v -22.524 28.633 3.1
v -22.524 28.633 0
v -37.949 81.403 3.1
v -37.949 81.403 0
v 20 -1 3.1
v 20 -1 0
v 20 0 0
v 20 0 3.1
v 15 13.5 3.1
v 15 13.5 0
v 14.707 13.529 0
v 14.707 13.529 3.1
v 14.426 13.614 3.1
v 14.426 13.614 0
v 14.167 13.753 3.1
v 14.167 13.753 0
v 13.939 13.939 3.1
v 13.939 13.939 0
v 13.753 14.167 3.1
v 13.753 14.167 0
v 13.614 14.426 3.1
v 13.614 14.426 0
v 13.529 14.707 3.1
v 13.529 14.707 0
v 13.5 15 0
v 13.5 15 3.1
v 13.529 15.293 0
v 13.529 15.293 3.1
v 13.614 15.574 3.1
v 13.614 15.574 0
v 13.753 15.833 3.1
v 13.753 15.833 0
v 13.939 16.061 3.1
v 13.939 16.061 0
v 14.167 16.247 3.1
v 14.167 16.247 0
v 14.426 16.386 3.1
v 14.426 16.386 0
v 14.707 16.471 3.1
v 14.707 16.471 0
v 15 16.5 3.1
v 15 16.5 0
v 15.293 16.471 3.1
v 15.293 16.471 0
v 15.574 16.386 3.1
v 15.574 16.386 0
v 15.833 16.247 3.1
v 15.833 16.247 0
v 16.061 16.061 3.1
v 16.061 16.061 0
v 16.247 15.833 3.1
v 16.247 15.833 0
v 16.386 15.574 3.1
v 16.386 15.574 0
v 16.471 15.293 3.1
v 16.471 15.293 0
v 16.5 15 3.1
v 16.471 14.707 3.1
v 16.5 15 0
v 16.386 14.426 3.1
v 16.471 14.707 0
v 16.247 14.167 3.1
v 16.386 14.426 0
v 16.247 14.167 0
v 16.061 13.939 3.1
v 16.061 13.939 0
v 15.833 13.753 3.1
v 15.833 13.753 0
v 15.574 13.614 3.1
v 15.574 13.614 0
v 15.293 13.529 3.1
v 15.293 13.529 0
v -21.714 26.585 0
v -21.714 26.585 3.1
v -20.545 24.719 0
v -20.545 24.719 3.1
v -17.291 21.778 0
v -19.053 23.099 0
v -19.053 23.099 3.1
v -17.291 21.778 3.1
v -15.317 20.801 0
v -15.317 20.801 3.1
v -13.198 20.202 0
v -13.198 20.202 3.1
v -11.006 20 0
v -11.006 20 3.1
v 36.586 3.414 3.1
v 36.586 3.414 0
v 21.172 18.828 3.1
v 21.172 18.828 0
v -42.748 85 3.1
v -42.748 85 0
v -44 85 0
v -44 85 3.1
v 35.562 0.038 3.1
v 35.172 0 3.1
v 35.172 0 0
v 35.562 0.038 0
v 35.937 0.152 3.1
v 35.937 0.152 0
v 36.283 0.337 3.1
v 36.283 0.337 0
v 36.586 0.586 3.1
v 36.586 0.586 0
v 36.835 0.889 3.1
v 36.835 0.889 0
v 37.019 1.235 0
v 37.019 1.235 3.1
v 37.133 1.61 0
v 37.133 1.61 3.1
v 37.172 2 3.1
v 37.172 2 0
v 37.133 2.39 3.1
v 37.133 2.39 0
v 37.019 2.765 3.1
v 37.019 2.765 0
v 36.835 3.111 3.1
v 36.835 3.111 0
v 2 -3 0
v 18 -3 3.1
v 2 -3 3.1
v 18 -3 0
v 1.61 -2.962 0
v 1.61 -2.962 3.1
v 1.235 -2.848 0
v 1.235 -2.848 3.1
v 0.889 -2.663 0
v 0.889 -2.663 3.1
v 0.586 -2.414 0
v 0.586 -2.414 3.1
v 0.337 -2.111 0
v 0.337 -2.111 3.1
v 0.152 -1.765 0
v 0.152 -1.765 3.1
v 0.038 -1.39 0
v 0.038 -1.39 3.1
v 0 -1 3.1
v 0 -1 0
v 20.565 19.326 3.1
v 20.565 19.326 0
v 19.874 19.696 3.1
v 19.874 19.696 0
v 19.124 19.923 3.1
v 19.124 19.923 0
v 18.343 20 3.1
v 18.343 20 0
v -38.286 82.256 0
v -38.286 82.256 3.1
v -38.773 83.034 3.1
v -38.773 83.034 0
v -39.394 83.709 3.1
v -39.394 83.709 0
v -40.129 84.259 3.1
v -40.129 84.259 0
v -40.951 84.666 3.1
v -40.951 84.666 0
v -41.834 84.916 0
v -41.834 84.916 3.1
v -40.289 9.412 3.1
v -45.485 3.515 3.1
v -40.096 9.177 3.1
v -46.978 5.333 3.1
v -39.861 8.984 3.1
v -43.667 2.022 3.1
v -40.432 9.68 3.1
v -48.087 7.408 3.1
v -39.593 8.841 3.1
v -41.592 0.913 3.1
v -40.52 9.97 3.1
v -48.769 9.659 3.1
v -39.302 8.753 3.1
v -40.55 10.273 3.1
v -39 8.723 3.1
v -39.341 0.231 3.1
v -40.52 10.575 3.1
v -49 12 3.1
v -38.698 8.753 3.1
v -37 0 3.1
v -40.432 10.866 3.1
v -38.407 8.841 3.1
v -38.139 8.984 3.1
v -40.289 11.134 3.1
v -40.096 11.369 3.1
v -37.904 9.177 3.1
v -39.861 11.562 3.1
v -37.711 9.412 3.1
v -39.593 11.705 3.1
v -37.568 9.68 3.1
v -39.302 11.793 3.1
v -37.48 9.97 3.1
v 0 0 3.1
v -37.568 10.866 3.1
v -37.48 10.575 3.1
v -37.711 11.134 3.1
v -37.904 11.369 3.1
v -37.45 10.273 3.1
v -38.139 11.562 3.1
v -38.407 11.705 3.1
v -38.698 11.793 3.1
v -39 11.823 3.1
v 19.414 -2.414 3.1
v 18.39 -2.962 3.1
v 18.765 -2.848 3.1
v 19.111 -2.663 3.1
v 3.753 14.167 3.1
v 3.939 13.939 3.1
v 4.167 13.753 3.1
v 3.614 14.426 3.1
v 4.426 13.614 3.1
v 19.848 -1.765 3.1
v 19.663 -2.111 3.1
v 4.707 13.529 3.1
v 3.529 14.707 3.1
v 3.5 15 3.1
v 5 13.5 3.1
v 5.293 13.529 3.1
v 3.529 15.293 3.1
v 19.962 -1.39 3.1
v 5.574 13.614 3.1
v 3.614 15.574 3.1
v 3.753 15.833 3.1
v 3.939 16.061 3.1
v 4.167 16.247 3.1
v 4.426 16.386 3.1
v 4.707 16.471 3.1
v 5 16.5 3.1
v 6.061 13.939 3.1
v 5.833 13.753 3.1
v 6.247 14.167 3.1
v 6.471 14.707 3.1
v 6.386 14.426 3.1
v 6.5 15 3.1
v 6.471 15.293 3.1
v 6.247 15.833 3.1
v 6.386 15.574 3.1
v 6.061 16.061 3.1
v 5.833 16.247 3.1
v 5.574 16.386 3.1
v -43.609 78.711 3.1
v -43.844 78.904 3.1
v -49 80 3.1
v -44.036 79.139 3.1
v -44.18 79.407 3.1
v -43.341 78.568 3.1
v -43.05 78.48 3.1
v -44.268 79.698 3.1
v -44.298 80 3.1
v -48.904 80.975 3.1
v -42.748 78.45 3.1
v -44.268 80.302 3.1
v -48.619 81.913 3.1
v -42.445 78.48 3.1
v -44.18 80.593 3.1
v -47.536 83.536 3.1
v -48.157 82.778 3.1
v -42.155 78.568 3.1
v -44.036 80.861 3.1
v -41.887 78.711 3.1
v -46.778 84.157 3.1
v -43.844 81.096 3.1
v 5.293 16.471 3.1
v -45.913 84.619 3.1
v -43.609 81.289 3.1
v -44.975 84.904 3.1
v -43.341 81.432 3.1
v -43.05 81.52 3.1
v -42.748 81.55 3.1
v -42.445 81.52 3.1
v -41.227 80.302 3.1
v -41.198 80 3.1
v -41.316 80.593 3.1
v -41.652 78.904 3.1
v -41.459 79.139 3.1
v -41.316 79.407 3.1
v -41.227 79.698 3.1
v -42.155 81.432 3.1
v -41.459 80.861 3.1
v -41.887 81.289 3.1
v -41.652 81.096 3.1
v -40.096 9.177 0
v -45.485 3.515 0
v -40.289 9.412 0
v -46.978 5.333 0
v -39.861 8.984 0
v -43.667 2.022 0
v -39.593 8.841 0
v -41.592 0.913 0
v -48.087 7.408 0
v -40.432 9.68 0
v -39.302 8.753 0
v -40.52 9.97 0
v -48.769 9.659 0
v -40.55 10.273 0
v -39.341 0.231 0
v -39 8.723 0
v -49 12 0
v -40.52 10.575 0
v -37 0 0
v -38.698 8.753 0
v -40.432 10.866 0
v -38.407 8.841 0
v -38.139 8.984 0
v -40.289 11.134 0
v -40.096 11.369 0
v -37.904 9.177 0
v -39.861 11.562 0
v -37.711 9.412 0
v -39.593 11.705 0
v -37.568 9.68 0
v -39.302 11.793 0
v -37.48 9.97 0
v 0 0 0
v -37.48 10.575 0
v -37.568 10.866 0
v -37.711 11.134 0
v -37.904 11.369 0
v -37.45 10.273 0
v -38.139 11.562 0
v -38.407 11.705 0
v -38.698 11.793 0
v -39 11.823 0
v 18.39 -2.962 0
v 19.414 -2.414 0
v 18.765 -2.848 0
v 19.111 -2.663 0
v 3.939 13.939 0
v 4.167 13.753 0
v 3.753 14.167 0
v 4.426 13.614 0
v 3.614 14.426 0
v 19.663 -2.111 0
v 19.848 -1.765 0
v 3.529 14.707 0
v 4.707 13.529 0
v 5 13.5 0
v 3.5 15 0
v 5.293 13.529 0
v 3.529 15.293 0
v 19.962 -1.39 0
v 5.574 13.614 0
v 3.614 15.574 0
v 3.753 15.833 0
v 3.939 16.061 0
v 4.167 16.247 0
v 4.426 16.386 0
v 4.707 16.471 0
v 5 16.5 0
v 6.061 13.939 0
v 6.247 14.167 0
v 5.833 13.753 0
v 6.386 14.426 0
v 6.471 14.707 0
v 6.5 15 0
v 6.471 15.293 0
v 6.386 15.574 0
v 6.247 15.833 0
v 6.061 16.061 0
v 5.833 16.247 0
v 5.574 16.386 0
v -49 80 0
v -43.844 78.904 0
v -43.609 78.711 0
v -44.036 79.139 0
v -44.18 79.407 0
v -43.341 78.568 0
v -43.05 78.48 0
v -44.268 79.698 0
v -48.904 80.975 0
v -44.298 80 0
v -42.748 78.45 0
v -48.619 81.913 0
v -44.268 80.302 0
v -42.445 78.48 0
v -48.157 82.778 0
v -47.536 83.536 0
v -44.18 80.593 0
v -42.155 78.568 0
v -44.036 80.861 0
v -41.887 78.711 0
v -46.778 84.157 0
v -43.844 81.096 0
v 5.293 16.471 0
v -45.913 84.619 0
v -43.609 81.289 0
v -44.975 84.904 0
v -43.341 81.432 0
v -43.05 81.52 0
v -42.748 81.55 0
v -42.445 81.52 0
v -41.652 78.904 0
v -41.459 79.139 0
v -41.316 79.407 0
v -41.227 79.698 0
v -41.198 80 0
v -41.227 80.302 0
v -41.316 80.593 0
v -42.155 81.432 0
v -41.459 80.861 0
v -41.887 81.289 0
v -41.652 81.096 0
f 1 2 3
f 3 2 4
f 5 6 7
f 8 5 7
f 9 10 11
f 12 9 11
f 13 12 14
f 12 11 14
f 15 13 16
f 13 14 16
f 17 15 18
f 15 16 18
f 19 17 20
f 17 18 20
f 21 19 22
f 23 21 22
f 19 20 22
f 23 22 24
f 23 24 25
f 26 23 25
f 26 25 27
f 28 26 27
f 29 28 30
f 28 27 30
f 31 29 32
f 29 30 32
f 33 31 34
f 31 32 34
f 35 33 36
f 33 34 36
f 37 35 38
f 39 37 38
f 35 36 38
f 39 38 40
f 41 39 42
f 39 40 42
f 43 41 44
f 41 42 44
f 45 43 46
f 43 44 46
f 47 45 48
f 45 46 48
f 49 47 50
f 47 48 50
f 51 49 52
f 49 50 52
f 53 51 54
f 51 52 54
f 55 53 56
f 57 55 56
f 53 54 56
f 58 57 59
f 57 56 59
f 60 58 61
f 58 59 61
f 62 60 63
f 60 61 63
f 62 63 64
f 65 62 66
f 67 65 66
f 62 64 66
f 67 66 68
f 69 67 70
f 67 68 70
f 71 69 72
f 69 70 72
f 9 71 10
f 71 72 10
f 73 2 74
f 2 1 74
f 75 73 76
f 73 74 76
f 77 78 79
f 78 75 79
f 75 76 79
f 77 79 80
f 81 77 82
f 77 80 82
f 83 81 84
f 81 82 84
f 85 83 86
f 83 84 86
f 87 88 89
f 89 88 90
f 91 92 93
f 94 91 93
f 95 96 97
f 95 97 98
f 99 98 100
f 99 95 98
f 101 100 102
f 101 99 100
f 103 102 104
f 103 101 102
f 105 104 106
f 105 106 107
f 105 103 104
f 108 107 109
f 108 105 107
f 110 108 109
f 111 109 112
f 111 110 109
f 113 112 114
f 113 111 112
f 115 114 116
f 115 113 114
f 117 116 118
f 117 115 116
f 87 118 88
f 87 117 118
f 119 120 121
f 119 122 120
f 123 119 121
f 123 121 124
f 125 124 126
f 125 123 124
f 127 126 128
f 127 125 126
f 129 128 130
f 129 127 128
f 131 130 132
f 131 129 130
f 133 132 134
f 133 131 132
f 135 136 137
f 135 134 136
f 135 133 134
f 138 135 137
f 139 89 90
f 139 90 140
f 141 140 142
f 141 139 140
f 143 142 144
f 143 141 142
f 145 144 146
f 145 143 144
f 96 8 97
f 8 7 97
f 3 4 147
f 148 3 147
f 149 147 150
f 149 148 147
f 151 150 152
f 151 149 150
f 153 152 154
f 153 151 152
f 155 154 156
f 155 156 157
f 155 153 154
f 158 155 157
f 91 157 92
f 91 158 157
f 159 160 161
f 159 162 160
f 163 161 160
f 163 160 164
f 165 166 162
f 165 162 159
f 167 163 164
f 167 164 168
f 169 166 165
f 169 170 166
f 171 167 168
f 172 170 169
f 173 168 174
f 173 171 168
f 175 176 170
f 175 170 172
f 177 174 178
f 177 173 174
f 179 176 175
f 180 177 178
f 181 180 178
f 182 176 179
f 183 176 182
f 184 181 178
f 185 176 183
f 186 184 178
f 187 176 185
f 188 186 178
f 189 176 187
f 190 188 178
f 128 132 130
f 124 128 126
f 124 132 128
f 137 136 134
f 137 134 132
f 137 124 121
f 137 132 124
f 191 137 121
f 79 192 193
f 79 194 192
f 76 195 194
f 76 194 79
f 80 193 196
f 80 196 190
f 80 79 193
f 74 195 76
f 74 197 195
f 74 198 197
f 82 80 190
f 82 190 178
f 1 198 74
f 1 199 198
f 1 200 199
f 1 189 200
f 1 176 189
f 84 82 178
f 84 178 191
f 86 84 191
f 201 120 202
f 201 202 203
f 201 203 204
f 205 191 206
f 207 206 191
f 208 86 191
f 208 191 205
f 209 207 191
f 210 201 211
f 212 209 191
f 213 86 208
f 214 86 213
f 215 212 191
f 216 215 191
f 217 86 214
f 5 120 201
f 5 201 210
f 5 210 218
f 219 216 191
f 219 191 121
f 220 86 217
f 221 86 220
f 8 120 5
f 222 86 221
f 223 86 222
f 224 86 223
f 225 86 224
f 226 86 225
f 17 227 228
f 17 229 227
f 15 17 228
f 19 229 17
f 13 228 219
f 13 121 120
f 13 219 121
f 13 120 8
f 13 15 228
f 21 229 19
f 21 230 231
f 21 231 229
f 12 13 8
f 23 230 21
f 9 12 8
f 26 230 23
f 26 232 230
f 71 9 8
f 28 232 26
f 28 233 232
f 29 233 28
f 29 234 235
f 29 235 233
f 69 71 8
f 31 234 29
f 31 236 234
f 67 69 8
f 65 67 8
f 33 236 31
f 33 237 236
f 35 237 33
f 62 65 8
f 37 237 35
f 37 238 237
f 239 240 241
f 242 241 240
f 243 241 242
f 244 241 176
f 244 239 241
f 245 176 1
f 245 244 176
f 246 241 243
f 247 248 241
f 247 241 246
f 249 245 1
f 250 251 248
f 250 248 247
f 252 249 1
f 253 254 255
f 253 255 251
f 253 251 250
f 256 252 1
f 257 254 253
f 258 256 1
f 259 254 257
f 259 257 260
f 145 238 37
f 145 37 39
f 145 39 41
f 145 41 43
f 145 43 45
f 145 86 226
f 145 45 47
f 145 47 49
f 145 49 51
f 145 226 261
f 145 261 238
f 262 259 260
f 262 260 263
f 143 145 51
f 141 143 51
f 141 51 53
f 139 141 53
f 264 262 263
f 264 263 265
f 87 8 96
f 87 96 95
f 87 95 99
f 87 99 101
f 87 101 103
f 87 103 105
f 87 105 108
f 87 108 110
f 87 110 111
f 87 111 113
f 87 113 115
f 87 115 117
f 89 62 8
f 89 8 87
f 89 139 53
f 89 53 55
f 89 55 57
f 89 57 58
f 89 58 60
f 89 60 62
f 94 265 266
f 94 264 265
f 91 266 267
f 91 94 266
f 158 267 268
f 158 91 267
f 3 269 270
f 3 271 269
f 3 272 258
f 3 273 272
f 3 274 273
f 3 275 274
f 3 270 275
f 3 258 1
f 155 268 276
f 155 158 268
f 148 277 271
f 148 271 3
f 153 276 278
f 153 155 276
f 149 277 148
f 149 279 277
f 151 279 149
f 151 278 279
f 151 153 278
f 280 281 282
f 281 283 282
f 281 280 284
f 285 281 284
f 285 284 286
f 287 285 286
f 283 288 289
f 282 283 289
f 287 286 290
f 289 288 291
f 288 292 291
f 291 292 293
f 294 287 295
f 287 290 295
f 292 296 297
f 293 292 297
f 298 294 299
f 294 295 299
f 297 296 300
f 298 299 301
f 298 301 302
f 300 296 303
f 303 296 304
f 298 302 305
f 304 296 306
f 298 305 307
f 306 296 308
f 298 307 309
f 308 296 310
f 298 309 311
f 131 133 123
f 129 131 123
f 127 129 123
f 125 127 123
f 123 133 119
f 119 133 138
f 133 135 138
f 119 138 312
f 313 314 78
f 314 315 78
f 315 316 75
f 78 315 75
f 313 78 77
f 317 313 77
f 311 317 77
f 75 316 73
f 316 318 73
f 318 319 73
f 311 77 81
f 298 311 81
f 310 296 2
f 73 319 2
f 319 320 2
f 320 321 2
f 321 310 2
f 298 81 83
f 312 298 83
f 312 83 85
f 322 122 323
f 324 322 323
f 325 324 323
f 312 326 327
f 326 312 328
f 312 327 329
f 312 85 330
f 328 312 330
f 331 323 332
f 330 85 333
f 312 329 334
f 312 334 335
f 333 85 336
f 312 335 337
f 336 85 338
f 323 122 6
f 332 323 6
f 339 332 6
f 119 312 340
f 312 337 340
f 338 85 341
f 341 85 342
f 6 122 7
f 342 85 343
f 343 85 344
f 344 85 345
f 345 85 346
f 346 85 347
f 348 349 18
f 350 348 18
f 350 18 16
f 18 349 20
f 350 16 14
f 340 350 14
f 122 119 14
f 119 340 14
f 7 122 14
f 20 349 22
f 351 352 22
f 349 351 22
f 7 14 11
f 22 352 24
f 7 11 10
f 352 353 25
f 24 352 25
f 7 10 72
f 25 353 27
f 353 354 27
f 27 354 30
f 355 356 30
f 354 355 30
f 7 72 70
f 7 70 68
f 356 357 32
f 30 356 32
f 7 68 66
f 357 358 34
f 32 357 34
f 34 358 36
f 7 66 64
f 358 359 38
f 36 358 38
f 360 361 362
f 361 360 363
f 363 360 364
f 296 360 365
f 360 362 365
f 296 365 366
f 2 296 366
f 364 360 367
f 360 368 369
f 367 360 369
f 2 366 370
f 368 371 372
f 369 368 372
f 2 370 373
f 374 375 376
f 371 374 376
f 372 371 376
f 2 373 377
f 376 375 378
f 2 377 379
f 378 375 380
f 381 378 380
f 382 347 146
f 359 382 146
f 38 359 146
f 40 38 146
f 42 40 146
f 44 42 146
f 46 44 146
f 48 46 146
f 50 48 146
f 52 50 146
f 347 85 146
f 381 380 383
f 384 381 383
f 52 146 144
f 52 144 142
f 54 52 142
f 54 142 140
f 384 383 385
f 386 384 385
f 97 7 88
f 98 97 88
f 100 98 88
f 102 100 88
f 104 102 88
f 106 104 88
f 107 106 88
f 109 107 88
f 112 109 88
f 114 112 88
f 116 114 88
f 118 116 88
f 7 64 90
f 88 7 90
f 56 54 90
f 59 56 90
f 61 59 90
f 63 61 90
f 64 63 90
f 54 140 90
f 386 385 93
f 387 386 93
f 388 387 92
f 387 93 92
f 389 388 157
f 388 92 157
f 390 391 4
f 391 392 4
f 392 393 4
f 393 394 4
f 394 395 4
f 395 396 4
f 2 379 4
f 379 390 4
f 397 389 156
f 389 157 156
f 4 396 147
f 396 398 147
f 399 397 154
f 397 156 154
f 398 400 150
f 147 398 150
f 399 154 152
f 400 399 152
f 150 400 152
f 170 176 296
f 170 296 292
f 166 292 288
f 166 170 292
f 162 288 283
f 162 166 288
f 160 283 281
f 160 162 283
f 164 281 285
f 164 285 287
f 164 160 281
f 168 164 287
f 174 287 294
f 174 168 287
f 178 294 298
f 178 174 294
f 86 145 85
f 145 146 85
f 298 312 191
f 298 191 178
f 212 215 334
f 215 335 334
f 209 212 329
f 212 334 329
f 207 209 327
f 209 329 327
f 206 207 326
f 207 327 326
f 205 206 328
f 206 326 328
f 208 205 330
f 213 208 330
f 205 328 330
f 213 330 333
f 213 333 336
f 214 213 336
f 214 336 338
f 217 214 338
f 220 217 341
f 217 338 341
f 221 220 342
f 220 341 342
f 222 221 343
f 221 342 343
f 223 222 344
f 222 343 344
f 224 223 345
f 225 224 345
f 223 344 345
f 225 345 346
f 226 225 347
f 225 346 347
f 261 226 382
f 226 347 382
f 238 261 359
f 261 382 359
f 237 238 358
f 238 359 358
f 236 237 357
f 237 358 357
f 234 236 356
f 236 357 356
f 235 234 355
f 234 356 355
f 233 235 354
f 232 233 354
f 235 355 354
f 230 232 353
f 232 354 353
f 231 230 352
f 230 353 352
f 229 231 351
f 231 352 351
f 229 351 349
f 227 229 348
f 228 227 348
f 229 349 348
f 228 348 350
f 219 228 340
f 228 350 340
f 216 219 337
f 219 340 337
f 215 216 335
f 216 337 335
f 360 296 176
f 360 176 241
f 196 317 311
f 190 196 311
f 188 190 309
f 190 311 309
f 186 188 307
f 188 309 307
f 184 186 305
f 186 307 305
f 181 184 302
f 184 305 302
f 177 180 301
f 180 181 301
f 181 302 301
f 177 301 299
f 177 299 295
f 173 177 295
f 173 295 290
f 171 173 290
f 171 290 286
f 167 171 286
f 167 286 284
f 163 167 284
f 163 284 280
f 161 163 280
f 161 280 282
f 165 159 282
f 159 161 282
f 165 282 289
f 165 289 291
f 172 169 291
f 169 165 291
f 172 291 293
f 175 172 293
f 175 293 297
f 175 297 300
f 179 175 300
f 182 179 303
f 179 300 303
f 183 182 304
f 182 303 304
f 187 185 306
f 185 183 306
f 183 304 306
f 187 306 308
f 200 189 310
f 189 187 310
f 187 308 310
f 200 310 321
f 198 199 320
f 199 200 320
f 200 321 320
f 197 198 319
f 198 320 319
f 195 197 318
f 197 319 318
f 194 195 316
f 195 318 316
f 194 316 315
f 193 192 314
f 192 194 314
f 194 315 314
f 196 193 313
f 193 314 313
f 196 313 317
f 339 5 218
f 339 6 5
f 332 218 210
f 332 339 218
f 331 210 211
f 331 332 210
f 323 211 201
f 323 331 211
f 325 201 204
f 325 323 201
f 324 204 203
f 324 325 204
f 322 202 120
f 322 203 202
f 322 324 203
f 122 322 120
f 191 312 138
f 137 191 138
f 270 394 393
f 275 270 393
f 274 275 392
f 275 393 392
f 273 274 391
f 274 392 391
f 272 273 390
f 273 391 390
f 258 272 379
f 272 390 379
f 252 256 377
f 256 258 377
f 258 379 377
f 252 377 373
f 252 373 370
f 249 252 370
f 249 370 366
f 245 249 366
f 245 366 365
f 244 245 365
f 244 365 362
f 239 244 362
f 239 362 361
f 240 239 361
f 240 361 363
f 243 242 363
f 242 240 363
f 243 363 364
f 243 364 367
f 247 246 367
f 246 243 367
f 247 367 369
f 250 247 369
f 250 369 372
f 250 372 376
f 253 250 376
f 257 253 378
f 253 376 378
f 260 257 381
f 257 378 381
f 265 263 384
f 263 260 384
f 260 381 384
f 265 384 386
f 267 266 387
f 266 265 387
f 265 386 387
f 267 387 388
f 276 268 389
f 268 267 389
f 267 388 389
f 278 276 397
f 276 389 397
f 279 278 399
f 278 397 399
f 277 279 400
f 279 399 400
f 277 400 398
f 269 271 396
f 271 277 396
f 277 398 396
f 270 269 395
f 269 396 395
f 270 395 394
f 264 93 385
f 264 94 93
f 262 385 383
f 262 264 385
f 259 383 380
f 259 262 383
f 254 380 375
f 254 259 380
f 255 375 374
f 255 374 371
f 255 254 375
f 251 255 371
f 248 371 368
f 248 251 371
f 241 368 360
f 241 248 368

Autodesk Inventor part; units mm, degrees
ref_plane "YZ Plane" through (0, 0, 0) normal (1, 0, 0) x (0, 1, 0)
ref_plane "XZ Plane" through (0, 0, 0) normal (0, 1, 0) x (-1, 0, 0)
ref_plane "XY Plane" through (0, 0, 0) normal (0, 0, 1) x (1, 0, 0)
ref_plane "Plano de trabajo1" through (0, 0, 0) normal (0, 0, 1) x (1, 0, 0)
sketch "Boceto1" plane through (0, 0, 0) normal (0, 0, 1) x (1, 0, 0)
  line L0 (0, 0) -> (0, -3) construction
  line L1 (20, -3) -> (0, -3) construction
  line L2 (20, 0) -> (20, -3) construction
  line L3 (20, 0) -> (-49, 0)
  line L4 (-49, 0) -> (-49, 85) construction
  line L5 (-49, 85) -> (20, 85) construction
  line L6 (20, 85) -> (20, 0) construction
  line L7 (0, 0) -> (0, -1)
  line L8 (20, -1) -> (20, 0)
  line L9 (18, -3) -> (2, -3)
  arc A0 (0, -1) -> (2, -3) centre (2, -1) ccw
  arc A1 (18, -3) -> (20, -1) centre (18, -1) ccw
  line L10 (20, 0) -> (35.1716, 0)
  line L11 (40, 0) -> (40, 20) construction
  line L12 (40, 20) -> (20, 20) construction
  line L13 (20, 20) -> (20, 0)
  line L14 (-34, 0) -> (-34, -3) construction
  circle A2 centre (-39, 10.2728) radius 1.55
  line L15 (40, 0) -> (20, 20)
  line L16 (20, 20) -> (-49, 20)
  line L17 (-20, 20) -> (-39, 85)
  line L18 (-49, 0) -> (-49, 85)
  line L19 (-39, 85) -> (-49, 85)
  line L20 (40, 0) -> (20, 0)
  circle A3 centre (-42.7477, 80) radius 1.4 construction
  circle A4 centre (-42.7477, 80) radius 1.55
  point P0 (35.1716, 0)
  dimension "d0" = 2
  dimension "d1" = 20
  dimension "d2" = 20
  dimension "d4" = 85
  dimension "d5" = 15
  dimension "d6" = 3.1
  dimension "d8" = 45
  dimension "d9" = 0
  dimension "d12" = 40
  dimension "d13" = 10
  dimension "d28" = 3.1
extrude "Extrusión1" add sketch "Boceto1" along normal blind 3.1
fillet "Empalme1" radius 2 1 edges at (40, 0, 1.55)
fillet "Empalme2" radius 12 1 edges at (-49, 0, 1.55)
fillet "Empalme3" radius 4 1 edges at (20, 20, 1.55)
fillet "Empalme4" radius 12 1 edges at (-20, 20, 1.55)
fillet "Empalme5" radius 5 2 edges at (-39, 85, 1.55) (-49, 85, 1.55)
sketch "Boceto2" plane through (0, 0, 3.1) normal (0, 0, 1) x (1, 0, 0)
  circle A0 centre (15, 15) radius 1.6 construction
  circle A1 centre (5, 15) radius 1.6 construction
  arc A2 (-44, 85) -> (-49, 80) centre (-44, 80) ccw construction
  arc A3 (-37.9485, 81.4028) -> (-42.7477, 85) centre (-42.7477, 80) ccw construction
  point P0 (0, 0)
hole "Agujero1" at (5, 15, 3.1) at (15, 15, 3.1) direction (0, 0, -1) diameter 3 end through all
equation "\"d14\" = d28"
properties part number "ParedLateralGrua1"
